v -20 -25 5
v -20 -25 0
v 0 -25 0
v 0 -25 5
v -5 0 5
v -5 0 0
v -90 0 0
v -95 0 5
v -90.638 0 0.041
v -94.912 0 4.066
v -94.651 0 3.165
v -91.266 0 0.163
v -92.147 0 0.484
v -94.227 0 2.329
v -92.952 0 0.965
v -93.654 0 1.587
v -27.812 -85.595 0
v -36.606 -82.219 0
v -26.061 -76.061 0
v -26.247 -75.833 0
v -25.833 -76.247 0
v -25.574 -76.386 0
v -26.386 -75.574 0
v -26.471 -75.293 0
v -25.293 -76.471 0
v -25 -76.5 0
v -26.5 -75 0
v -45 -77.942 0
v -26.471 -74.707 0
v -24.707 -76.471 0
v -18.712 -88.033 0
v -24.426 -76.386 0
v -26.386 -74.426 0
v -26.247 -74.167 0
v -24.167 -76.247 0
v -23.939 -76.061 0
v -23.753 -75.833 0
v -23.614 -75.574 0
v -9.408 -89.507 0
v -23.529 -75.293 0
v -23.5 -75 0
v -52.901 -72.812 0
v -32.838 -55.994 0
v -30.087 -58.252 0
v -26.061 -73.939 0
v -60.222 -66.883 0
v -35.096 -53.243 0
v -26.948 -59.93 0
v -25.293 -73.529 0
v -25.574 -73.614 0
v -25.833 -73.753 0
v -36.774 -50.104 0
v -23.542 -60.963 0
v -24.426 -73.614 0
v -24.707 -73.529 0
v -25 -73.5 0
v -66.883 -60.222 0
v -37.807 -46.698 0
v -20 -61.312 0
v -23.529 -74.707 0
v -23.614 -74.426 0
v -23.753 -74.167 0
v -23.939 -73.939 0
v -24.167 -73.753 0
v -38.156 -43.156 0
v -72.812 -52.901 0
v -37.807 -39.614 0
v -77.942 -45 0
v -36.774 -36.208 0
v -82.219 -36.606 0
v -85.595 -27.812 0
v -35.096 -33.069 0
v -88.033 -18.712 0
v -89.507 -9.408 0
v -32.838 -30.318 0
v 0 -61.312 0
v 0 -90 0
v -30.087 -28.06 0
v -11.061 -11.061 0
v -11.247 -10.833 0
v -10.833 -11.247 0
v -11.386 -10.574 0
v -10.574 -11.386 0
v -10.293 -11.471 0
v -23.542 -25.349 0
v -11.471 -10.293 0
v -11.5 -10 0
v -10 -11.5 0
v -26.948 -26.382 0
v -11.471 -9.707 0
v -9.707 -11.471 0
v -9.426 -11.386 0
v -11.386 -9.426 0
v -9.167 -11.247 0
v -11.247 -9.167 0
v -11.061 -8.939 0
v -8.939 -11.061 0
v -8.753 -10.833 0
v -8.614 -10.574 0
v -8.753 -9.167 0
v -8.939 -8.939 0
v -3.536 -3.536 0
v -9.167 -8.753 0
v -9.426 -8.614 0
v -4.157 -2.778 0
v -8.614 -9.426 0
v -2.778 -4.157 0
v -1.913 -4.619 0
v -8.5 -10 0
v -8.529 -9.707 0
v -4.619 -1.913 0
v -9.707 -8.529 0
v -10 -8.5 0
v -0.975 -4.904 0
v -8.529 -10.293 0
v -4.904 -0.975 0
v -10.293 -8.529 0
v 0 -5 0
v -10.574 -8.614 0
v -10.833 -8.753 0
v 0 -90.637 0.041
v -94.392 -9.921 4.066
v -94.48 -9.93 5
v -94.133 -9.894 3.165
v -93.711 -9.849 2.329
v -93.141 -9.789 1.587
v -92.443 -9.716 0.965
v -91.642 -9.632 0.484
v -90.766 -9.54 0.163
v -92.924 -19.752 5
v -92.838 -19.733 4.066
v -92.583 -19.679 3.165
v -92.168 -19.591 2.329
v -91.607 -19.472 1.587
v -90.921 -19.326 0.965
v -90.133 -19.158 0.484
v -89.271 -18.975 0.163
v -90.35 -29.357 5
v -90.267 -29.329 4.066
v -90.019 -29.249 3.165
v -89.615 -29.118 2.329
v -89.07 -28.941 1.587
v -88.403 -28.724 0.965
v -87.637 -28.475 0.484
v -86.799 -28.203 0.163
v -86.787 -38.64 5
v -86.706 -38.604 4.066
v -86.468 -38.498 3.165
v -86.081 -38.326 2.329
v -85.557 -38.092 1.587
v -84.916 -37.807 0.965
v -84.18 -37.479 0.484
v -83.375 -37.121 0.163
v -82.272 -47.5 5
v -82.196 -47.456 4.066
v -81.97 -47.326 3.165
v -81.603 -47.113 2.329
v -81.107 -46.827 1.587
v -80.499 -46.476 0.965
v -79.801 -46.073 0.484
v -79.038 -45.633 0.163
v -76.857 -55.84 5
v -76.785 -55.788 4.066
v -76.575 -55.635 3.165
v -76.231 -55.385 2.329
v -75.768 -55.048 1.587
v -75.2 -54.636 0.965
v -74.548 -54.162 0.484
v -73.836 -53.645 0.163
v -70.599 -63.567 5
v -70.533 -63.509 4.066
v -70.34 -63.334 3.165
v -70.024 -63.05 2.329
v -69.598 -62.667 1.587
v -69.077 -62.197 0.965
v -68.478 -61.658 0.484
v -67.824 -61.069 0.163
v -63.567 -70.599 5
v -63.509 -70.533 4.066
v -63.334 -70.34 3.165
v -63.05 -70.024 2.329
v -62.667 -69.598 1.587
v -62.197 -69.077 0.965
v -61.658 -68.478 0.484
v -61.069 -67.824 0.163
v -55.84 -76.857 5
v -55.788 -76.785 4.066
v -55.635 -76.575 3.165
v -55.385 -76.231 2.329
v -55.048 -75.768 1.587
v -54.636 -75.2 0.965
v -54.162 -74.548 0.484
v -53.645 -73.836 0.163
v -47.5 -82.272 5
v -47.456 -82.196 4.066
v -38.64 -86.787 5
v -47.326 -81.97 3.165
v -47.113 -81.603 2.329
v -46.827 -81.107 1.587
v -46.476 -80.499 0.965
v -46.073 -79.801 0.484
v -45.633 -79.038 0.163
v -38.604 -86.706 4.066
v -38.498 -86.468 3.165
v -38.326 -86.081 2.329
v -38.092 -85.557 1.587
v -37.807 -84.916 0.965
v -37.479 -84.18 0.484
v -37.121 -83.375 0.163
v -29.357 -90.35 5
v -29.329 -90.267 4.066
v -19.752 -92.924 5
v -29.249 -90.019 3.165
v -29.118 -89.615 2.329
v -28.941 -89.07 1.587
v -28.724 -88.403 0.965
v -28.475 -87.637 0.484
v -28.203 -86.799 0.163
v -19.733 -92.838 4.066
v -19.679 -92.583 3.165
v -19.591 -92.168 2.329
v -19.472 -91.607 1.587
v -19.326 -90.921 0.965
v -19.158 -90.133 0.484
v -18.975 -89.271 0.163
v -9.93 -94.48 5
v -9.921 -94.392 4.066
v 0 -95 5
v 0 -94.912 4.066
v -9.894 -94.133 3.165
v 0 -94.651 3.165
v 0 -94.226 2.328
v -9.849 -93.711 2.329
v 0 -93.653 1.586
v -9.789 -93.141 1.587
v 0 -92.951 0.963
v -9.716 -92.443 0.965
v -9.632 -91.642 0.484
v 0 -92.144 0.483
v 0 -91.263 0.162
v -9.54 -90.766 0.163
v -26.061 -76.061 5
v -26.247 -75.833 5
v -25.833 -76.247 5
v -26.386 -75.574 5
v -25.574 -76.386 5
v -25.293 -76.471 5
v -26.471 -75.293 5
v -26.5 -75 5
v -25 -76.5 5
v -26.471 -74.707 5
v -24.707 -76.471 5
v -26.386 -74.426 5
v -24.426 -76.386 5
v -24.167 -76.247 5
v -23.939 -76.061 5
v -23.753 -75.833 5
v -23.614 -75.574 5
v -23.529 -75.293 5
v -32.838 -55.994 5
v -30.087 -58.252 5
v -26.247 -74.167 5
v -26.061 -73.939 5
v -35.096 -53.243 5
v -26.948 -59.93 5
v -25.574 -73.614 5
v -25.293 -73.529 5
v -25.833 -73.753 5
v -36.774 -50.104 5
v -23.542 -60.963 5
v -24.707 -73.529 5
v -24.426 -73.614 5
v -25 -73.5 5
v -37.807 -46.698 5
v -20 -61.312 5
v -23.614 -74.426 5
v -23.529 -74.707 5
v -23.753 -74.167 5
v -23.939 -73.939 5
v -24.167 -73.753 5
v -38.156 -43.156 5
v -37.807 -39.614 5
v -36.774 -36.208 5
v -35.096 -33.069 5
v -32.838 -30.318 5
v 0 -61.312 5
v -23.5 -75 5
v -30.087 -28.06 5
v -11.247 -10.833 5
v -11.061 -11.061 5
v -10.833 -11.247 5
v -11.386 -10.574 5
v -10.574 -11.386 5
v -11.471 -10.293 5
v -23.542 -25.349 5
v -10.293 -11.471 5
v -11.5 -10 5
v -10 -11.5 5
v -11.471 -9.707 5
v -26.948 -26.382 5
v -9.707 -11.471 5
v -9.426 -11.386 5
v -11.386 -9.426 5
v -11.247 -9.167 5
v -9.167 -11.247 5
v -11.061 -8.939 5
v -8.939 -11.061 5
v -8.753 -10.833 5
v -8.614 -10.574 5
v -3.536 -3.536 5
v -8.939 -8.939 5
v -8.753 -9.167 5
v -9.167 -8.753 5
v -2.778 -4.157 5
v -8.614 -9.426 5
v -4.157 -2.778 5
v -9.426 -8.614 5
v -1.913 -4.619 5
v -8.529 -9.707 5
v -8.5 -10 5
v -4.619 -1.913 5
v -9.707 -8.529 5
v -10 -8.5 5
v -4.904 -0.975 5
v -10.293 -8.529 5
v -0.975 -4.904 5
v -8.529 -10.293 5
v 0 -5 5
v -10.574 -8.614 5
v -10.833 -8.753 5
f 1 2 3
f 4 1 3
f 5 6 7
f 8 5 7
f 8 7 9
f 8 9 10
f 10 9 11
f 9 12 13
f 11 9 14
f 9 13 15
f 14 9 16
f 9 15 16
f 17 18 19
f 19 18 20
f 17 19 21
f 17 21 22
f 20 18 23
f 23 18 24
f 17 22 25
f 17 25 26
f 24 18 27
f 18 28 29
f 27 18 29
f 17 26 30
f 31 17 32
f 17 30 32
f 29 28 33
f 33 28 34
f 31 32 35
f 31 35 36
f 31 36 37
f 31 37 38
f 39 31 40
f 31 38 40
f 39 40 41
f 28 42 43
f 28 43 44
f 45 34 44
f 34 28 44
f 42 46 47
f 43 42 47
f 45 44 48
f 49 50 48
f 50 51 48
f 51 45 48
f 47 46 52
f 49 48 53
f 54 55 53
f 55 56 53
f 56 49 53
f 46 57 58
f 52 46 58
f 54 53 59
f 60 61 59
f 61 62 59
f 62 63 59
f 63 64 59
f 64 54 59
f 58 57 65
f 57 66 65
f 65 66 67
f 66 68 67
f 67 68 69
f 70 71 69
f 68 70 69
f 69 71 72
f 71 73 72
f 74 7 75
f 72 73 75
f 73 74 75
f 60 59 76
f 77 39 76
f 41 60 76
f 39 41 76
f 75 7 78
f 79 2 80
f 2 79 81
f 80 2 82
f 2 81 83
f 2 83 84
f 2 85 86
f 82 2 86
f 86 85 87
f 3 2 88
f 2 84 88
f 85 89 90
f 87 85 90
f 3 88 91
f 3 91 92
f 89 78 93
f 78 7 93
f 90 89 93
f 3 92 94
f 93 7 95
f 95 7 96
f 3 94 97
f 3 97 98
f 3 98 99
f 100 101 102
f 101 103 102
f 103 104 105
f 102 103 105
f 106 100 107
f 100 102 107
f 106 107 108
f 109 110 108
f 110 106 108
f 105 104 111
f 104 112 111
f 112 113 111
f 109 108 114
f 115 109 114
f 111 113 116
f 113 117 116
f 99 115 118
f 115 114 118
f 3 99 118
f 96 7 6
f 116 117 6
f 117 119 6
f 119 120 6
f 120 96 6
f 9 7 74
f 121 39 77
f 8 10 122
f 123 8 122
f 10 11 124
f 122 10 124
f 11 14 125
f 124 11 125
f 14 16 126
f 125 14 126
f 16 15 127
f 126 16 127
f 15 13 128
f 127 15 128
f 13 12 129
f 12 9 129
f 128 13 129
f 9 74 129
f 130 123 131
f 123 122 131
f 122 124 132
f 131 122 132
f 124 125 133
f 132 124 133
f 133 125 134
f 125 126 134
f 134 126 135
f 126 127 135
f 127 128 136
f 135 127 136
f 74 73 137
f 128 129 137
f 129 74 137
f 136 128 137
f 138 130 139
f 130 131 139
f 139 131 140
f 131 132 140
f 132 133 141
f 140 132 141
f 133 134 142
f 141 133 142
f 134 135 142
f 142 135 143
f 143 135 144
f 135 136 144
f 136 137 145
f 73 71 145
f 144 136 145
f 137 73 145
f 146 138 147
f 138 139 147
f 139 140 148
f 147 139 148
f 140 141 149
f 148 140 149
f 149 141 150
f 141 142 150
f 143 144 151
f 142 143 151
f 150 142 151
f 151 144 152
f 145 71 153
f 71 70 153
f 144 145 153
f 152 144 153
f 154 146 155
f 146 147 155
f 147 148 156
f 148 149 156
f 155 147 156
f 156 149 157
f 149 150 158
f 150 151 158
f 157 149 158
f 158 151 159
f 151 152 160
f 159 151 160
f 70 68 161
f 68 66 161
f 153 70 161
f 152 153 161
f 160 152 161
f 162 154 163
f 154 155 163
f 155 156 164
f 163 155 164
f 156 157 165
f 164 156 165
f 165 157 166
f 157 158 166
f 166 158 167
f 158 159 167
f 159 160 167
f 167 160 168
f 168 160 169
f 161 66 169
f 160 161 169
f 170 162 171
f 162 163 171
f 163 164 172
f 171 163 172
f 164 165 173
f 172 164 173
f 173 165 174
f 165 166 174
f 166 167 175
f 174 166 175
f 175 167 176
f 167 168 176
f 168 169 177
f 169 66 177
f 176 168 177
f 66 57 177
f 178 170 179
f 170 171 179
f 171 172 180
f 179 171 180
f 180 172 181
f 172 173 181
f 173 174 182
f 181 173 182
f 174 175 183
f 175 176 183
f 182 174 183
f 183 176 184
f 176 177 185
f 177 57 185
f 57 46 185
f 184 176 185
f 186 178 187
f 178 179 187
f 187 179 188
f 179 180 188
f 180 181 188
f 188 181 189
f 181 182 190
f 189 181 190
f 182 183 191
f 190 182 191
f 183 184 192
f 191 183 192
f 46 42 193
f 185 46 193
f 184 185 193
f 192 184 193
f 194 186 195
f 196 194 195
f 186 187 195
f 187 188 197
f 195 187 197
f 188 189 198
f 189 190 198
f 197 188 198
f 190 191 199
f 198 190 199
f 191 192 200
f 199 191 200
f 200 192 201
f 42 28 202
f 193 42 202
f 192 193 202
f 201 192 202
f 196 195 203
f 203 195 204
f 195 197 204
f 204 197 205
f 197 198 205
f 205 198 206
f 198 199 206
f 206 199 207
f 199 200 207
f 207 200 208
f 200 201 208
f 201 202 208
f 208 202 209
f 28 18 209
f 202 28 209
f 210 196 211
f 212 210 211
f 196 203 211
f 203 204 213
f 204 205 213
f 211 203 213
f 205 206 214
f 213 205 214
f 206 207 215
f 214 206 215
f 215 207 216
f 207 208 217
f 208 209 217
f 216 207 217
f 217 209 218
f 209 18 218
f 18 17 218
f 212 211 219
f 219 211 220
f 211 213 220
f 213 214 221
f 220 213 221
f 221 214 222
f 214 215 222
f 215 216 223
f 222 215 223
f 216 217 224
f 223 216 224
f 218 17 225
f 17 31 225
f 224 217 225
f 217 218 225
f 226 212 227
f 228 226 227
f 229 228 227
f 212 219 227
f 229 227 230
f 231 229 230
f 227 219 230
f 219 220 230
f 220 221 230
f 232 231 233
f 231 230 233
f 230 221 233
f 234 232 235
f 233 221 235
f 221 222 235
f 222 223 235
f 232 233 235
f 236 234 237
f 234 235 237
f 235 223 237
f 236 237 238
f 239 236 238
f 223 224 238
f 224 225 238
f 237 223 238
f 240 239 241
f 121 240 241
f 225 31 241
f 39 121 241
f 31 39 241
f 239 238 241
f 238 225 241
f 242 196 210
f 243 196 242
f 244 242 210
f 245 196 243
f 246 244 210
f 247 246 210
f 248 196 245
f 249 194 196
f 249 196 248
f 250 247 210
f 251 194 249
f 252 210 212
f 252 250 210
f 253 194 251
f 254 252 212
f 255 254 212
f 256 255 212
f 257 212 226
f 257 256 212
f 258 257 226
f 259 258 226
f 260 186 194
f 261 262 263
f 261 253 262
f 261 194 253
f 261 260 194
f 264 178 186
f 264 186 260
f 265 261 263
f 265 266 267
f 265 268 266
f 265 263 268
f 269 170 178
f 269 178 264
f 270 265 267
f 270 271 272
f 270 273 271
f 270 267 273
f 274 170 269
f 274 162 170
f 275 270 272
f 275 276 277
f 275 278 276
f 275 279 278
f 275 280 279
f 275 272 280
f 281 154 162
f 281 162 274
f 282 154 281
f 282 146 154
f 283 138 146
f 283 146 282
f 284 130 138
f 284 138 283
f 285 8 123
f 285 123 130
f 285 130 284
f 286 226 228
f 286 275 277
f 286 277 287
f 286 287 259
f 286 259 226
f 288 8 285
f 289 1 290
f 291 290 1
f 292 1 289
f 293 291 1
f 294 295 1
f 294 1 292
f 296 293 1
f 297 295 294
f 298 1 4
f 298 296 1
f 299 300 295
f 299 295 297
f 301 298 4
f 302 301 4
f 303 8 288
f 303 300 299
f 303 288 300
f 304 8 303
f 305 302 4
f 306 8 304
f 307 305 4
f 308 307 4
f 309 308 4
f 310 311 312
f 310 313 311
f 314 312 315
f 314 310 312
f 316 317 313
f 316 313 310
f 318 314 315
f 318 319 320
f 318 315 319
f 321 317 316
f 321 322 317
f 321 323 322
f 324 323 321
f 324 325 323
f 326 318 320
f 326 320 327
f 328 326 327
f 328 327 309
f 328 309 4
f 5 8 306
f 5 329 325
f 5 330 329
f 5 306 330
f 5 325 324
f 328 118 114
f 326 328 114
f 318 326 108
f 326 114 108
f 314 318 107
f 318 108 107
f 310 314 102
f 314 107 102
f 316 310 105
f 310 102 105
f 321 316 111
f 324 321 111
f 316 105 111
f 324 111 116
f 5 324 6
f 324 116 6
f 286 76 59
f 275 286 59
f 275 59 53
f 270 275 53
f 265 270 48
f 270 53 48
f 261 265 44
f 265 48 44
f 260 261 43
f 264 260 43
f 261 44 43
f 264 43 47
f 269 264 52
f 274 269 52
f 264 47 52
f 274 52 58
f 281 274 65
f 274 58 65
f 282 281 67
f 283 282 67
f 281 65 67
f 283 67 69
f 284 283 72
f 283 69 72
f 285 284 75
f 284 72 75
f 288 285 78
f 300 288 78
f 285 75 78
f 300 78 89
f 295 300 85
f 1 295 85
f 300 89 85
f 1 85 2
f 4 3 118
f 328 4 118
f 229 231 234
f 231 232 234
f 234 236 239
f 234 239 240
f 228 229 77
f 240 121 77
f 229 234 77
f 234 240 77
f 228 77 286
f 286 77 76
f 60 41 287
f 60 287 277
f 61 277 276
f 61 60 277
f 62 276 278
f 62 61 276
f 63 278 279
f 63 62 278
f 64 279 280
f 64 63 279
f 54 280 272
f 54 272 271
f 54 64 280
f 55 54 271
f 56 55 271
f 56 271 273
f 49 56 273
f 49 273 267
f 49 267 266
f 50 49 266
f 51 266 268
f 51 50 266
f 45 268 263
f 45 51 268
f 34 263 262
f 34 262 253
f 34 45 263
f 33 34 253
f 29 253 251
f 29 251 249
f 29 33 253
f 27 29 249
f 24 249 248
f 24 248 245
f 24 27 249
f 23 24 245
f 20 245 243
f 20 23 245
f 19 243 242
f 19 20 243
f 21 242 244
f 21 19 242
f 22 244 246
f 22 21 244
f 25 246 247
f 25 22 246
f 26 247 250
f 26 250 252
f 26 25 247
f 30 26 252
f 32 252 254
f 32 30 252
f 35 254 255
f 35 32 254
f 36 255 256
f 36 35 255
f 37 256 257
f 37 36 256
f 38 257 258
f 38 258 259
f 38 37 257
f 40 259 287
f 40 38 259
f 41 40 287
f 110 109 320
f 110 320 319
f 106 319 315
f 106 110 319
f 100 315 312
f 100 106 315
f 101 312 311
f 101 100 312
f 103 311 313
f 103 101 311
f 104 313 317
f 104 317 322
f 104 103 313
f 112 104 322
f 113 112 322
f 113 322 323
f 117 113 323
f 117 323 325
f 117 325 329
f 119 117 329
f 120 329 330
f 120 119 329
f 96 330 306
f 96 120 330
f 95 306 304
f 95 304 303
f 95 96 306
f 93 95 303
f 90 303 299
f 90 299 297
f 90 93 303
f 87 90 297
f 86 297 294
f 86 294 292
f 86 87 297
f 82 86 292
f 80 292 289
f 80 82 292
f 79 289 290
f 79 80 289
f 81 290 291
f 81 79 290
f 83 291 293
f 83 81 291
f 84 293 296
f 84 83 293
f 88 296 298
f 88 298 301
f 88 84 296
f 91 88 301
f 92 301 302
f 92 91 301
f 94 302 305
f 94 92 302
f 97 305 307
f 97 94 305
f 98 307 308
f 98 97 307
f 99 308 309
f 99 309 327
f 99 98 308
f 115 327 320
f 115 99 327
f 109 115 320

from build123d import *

# Parameters (mm, degrees)
SKETCH_1_R          = 1.5
EXTRUDE_1_DEPTH     = 5
CUT_EXTRUDE_1_DEPTH = 135.443296597
FILLET_2_R          = 5


with BuildPart() as part:
    # 草圖1 → 填料-伸長1 (new body)
    with BuildSketch(Plane.XY):
        with BuildLine():
            Line((-5, 0), (-95, 0))
            ThreePointArc((-95, 0), (-67.175144213, -67.175144213), (0, -95))
            Line((0, -95), (0, -5))
            ThreePointArc((0, -5), (-3.535533906, -3.535533906), (-5, 0))
        make_face()
        with Locations((-10, -10)):
            Circle(SKETCH_1_R, mode=Mode.SUBTRACT)
        with Locations((-25, -75)):
            Circle(SKETCH_1_R, mode=Mode.SUBTRACT)
    extrude(amount=EXTRUDE_1_DEPTH)

    # 草圖2 → 除料-伸長1 (cut, through all)
    with BuildSketch(Plane(origin=(0, 0, 0), x_dir=(-1, 0, 0), z_dir=(0, 0, -1))):
        with BuildLine():
            Line((0, -25), (0, -61.312071511))
            Line((0, -61.312071511), (20, -61.312071511))
            ThreePointArc((20, -61.312071511), (38.156035755, -43.156035755), (20, -25))
            Line((20, -25), (0, -25))
        make_face()
    extrude(amount=-CUT_EXTRUDE_1_DEPTH, mode=Mode.SUBTRACT)

    # 圓角2
    fillet_2_edges = [part.edges().sort_by_distance(p)[0] for p in [
        (-67.175144213, -67.175144213, 0),
    ]]
    fillet(fillet_2_edges, radius=FILLET_2_R - 0.0001)  # a hair under: the kernel refuses the full size


solid = part.part
